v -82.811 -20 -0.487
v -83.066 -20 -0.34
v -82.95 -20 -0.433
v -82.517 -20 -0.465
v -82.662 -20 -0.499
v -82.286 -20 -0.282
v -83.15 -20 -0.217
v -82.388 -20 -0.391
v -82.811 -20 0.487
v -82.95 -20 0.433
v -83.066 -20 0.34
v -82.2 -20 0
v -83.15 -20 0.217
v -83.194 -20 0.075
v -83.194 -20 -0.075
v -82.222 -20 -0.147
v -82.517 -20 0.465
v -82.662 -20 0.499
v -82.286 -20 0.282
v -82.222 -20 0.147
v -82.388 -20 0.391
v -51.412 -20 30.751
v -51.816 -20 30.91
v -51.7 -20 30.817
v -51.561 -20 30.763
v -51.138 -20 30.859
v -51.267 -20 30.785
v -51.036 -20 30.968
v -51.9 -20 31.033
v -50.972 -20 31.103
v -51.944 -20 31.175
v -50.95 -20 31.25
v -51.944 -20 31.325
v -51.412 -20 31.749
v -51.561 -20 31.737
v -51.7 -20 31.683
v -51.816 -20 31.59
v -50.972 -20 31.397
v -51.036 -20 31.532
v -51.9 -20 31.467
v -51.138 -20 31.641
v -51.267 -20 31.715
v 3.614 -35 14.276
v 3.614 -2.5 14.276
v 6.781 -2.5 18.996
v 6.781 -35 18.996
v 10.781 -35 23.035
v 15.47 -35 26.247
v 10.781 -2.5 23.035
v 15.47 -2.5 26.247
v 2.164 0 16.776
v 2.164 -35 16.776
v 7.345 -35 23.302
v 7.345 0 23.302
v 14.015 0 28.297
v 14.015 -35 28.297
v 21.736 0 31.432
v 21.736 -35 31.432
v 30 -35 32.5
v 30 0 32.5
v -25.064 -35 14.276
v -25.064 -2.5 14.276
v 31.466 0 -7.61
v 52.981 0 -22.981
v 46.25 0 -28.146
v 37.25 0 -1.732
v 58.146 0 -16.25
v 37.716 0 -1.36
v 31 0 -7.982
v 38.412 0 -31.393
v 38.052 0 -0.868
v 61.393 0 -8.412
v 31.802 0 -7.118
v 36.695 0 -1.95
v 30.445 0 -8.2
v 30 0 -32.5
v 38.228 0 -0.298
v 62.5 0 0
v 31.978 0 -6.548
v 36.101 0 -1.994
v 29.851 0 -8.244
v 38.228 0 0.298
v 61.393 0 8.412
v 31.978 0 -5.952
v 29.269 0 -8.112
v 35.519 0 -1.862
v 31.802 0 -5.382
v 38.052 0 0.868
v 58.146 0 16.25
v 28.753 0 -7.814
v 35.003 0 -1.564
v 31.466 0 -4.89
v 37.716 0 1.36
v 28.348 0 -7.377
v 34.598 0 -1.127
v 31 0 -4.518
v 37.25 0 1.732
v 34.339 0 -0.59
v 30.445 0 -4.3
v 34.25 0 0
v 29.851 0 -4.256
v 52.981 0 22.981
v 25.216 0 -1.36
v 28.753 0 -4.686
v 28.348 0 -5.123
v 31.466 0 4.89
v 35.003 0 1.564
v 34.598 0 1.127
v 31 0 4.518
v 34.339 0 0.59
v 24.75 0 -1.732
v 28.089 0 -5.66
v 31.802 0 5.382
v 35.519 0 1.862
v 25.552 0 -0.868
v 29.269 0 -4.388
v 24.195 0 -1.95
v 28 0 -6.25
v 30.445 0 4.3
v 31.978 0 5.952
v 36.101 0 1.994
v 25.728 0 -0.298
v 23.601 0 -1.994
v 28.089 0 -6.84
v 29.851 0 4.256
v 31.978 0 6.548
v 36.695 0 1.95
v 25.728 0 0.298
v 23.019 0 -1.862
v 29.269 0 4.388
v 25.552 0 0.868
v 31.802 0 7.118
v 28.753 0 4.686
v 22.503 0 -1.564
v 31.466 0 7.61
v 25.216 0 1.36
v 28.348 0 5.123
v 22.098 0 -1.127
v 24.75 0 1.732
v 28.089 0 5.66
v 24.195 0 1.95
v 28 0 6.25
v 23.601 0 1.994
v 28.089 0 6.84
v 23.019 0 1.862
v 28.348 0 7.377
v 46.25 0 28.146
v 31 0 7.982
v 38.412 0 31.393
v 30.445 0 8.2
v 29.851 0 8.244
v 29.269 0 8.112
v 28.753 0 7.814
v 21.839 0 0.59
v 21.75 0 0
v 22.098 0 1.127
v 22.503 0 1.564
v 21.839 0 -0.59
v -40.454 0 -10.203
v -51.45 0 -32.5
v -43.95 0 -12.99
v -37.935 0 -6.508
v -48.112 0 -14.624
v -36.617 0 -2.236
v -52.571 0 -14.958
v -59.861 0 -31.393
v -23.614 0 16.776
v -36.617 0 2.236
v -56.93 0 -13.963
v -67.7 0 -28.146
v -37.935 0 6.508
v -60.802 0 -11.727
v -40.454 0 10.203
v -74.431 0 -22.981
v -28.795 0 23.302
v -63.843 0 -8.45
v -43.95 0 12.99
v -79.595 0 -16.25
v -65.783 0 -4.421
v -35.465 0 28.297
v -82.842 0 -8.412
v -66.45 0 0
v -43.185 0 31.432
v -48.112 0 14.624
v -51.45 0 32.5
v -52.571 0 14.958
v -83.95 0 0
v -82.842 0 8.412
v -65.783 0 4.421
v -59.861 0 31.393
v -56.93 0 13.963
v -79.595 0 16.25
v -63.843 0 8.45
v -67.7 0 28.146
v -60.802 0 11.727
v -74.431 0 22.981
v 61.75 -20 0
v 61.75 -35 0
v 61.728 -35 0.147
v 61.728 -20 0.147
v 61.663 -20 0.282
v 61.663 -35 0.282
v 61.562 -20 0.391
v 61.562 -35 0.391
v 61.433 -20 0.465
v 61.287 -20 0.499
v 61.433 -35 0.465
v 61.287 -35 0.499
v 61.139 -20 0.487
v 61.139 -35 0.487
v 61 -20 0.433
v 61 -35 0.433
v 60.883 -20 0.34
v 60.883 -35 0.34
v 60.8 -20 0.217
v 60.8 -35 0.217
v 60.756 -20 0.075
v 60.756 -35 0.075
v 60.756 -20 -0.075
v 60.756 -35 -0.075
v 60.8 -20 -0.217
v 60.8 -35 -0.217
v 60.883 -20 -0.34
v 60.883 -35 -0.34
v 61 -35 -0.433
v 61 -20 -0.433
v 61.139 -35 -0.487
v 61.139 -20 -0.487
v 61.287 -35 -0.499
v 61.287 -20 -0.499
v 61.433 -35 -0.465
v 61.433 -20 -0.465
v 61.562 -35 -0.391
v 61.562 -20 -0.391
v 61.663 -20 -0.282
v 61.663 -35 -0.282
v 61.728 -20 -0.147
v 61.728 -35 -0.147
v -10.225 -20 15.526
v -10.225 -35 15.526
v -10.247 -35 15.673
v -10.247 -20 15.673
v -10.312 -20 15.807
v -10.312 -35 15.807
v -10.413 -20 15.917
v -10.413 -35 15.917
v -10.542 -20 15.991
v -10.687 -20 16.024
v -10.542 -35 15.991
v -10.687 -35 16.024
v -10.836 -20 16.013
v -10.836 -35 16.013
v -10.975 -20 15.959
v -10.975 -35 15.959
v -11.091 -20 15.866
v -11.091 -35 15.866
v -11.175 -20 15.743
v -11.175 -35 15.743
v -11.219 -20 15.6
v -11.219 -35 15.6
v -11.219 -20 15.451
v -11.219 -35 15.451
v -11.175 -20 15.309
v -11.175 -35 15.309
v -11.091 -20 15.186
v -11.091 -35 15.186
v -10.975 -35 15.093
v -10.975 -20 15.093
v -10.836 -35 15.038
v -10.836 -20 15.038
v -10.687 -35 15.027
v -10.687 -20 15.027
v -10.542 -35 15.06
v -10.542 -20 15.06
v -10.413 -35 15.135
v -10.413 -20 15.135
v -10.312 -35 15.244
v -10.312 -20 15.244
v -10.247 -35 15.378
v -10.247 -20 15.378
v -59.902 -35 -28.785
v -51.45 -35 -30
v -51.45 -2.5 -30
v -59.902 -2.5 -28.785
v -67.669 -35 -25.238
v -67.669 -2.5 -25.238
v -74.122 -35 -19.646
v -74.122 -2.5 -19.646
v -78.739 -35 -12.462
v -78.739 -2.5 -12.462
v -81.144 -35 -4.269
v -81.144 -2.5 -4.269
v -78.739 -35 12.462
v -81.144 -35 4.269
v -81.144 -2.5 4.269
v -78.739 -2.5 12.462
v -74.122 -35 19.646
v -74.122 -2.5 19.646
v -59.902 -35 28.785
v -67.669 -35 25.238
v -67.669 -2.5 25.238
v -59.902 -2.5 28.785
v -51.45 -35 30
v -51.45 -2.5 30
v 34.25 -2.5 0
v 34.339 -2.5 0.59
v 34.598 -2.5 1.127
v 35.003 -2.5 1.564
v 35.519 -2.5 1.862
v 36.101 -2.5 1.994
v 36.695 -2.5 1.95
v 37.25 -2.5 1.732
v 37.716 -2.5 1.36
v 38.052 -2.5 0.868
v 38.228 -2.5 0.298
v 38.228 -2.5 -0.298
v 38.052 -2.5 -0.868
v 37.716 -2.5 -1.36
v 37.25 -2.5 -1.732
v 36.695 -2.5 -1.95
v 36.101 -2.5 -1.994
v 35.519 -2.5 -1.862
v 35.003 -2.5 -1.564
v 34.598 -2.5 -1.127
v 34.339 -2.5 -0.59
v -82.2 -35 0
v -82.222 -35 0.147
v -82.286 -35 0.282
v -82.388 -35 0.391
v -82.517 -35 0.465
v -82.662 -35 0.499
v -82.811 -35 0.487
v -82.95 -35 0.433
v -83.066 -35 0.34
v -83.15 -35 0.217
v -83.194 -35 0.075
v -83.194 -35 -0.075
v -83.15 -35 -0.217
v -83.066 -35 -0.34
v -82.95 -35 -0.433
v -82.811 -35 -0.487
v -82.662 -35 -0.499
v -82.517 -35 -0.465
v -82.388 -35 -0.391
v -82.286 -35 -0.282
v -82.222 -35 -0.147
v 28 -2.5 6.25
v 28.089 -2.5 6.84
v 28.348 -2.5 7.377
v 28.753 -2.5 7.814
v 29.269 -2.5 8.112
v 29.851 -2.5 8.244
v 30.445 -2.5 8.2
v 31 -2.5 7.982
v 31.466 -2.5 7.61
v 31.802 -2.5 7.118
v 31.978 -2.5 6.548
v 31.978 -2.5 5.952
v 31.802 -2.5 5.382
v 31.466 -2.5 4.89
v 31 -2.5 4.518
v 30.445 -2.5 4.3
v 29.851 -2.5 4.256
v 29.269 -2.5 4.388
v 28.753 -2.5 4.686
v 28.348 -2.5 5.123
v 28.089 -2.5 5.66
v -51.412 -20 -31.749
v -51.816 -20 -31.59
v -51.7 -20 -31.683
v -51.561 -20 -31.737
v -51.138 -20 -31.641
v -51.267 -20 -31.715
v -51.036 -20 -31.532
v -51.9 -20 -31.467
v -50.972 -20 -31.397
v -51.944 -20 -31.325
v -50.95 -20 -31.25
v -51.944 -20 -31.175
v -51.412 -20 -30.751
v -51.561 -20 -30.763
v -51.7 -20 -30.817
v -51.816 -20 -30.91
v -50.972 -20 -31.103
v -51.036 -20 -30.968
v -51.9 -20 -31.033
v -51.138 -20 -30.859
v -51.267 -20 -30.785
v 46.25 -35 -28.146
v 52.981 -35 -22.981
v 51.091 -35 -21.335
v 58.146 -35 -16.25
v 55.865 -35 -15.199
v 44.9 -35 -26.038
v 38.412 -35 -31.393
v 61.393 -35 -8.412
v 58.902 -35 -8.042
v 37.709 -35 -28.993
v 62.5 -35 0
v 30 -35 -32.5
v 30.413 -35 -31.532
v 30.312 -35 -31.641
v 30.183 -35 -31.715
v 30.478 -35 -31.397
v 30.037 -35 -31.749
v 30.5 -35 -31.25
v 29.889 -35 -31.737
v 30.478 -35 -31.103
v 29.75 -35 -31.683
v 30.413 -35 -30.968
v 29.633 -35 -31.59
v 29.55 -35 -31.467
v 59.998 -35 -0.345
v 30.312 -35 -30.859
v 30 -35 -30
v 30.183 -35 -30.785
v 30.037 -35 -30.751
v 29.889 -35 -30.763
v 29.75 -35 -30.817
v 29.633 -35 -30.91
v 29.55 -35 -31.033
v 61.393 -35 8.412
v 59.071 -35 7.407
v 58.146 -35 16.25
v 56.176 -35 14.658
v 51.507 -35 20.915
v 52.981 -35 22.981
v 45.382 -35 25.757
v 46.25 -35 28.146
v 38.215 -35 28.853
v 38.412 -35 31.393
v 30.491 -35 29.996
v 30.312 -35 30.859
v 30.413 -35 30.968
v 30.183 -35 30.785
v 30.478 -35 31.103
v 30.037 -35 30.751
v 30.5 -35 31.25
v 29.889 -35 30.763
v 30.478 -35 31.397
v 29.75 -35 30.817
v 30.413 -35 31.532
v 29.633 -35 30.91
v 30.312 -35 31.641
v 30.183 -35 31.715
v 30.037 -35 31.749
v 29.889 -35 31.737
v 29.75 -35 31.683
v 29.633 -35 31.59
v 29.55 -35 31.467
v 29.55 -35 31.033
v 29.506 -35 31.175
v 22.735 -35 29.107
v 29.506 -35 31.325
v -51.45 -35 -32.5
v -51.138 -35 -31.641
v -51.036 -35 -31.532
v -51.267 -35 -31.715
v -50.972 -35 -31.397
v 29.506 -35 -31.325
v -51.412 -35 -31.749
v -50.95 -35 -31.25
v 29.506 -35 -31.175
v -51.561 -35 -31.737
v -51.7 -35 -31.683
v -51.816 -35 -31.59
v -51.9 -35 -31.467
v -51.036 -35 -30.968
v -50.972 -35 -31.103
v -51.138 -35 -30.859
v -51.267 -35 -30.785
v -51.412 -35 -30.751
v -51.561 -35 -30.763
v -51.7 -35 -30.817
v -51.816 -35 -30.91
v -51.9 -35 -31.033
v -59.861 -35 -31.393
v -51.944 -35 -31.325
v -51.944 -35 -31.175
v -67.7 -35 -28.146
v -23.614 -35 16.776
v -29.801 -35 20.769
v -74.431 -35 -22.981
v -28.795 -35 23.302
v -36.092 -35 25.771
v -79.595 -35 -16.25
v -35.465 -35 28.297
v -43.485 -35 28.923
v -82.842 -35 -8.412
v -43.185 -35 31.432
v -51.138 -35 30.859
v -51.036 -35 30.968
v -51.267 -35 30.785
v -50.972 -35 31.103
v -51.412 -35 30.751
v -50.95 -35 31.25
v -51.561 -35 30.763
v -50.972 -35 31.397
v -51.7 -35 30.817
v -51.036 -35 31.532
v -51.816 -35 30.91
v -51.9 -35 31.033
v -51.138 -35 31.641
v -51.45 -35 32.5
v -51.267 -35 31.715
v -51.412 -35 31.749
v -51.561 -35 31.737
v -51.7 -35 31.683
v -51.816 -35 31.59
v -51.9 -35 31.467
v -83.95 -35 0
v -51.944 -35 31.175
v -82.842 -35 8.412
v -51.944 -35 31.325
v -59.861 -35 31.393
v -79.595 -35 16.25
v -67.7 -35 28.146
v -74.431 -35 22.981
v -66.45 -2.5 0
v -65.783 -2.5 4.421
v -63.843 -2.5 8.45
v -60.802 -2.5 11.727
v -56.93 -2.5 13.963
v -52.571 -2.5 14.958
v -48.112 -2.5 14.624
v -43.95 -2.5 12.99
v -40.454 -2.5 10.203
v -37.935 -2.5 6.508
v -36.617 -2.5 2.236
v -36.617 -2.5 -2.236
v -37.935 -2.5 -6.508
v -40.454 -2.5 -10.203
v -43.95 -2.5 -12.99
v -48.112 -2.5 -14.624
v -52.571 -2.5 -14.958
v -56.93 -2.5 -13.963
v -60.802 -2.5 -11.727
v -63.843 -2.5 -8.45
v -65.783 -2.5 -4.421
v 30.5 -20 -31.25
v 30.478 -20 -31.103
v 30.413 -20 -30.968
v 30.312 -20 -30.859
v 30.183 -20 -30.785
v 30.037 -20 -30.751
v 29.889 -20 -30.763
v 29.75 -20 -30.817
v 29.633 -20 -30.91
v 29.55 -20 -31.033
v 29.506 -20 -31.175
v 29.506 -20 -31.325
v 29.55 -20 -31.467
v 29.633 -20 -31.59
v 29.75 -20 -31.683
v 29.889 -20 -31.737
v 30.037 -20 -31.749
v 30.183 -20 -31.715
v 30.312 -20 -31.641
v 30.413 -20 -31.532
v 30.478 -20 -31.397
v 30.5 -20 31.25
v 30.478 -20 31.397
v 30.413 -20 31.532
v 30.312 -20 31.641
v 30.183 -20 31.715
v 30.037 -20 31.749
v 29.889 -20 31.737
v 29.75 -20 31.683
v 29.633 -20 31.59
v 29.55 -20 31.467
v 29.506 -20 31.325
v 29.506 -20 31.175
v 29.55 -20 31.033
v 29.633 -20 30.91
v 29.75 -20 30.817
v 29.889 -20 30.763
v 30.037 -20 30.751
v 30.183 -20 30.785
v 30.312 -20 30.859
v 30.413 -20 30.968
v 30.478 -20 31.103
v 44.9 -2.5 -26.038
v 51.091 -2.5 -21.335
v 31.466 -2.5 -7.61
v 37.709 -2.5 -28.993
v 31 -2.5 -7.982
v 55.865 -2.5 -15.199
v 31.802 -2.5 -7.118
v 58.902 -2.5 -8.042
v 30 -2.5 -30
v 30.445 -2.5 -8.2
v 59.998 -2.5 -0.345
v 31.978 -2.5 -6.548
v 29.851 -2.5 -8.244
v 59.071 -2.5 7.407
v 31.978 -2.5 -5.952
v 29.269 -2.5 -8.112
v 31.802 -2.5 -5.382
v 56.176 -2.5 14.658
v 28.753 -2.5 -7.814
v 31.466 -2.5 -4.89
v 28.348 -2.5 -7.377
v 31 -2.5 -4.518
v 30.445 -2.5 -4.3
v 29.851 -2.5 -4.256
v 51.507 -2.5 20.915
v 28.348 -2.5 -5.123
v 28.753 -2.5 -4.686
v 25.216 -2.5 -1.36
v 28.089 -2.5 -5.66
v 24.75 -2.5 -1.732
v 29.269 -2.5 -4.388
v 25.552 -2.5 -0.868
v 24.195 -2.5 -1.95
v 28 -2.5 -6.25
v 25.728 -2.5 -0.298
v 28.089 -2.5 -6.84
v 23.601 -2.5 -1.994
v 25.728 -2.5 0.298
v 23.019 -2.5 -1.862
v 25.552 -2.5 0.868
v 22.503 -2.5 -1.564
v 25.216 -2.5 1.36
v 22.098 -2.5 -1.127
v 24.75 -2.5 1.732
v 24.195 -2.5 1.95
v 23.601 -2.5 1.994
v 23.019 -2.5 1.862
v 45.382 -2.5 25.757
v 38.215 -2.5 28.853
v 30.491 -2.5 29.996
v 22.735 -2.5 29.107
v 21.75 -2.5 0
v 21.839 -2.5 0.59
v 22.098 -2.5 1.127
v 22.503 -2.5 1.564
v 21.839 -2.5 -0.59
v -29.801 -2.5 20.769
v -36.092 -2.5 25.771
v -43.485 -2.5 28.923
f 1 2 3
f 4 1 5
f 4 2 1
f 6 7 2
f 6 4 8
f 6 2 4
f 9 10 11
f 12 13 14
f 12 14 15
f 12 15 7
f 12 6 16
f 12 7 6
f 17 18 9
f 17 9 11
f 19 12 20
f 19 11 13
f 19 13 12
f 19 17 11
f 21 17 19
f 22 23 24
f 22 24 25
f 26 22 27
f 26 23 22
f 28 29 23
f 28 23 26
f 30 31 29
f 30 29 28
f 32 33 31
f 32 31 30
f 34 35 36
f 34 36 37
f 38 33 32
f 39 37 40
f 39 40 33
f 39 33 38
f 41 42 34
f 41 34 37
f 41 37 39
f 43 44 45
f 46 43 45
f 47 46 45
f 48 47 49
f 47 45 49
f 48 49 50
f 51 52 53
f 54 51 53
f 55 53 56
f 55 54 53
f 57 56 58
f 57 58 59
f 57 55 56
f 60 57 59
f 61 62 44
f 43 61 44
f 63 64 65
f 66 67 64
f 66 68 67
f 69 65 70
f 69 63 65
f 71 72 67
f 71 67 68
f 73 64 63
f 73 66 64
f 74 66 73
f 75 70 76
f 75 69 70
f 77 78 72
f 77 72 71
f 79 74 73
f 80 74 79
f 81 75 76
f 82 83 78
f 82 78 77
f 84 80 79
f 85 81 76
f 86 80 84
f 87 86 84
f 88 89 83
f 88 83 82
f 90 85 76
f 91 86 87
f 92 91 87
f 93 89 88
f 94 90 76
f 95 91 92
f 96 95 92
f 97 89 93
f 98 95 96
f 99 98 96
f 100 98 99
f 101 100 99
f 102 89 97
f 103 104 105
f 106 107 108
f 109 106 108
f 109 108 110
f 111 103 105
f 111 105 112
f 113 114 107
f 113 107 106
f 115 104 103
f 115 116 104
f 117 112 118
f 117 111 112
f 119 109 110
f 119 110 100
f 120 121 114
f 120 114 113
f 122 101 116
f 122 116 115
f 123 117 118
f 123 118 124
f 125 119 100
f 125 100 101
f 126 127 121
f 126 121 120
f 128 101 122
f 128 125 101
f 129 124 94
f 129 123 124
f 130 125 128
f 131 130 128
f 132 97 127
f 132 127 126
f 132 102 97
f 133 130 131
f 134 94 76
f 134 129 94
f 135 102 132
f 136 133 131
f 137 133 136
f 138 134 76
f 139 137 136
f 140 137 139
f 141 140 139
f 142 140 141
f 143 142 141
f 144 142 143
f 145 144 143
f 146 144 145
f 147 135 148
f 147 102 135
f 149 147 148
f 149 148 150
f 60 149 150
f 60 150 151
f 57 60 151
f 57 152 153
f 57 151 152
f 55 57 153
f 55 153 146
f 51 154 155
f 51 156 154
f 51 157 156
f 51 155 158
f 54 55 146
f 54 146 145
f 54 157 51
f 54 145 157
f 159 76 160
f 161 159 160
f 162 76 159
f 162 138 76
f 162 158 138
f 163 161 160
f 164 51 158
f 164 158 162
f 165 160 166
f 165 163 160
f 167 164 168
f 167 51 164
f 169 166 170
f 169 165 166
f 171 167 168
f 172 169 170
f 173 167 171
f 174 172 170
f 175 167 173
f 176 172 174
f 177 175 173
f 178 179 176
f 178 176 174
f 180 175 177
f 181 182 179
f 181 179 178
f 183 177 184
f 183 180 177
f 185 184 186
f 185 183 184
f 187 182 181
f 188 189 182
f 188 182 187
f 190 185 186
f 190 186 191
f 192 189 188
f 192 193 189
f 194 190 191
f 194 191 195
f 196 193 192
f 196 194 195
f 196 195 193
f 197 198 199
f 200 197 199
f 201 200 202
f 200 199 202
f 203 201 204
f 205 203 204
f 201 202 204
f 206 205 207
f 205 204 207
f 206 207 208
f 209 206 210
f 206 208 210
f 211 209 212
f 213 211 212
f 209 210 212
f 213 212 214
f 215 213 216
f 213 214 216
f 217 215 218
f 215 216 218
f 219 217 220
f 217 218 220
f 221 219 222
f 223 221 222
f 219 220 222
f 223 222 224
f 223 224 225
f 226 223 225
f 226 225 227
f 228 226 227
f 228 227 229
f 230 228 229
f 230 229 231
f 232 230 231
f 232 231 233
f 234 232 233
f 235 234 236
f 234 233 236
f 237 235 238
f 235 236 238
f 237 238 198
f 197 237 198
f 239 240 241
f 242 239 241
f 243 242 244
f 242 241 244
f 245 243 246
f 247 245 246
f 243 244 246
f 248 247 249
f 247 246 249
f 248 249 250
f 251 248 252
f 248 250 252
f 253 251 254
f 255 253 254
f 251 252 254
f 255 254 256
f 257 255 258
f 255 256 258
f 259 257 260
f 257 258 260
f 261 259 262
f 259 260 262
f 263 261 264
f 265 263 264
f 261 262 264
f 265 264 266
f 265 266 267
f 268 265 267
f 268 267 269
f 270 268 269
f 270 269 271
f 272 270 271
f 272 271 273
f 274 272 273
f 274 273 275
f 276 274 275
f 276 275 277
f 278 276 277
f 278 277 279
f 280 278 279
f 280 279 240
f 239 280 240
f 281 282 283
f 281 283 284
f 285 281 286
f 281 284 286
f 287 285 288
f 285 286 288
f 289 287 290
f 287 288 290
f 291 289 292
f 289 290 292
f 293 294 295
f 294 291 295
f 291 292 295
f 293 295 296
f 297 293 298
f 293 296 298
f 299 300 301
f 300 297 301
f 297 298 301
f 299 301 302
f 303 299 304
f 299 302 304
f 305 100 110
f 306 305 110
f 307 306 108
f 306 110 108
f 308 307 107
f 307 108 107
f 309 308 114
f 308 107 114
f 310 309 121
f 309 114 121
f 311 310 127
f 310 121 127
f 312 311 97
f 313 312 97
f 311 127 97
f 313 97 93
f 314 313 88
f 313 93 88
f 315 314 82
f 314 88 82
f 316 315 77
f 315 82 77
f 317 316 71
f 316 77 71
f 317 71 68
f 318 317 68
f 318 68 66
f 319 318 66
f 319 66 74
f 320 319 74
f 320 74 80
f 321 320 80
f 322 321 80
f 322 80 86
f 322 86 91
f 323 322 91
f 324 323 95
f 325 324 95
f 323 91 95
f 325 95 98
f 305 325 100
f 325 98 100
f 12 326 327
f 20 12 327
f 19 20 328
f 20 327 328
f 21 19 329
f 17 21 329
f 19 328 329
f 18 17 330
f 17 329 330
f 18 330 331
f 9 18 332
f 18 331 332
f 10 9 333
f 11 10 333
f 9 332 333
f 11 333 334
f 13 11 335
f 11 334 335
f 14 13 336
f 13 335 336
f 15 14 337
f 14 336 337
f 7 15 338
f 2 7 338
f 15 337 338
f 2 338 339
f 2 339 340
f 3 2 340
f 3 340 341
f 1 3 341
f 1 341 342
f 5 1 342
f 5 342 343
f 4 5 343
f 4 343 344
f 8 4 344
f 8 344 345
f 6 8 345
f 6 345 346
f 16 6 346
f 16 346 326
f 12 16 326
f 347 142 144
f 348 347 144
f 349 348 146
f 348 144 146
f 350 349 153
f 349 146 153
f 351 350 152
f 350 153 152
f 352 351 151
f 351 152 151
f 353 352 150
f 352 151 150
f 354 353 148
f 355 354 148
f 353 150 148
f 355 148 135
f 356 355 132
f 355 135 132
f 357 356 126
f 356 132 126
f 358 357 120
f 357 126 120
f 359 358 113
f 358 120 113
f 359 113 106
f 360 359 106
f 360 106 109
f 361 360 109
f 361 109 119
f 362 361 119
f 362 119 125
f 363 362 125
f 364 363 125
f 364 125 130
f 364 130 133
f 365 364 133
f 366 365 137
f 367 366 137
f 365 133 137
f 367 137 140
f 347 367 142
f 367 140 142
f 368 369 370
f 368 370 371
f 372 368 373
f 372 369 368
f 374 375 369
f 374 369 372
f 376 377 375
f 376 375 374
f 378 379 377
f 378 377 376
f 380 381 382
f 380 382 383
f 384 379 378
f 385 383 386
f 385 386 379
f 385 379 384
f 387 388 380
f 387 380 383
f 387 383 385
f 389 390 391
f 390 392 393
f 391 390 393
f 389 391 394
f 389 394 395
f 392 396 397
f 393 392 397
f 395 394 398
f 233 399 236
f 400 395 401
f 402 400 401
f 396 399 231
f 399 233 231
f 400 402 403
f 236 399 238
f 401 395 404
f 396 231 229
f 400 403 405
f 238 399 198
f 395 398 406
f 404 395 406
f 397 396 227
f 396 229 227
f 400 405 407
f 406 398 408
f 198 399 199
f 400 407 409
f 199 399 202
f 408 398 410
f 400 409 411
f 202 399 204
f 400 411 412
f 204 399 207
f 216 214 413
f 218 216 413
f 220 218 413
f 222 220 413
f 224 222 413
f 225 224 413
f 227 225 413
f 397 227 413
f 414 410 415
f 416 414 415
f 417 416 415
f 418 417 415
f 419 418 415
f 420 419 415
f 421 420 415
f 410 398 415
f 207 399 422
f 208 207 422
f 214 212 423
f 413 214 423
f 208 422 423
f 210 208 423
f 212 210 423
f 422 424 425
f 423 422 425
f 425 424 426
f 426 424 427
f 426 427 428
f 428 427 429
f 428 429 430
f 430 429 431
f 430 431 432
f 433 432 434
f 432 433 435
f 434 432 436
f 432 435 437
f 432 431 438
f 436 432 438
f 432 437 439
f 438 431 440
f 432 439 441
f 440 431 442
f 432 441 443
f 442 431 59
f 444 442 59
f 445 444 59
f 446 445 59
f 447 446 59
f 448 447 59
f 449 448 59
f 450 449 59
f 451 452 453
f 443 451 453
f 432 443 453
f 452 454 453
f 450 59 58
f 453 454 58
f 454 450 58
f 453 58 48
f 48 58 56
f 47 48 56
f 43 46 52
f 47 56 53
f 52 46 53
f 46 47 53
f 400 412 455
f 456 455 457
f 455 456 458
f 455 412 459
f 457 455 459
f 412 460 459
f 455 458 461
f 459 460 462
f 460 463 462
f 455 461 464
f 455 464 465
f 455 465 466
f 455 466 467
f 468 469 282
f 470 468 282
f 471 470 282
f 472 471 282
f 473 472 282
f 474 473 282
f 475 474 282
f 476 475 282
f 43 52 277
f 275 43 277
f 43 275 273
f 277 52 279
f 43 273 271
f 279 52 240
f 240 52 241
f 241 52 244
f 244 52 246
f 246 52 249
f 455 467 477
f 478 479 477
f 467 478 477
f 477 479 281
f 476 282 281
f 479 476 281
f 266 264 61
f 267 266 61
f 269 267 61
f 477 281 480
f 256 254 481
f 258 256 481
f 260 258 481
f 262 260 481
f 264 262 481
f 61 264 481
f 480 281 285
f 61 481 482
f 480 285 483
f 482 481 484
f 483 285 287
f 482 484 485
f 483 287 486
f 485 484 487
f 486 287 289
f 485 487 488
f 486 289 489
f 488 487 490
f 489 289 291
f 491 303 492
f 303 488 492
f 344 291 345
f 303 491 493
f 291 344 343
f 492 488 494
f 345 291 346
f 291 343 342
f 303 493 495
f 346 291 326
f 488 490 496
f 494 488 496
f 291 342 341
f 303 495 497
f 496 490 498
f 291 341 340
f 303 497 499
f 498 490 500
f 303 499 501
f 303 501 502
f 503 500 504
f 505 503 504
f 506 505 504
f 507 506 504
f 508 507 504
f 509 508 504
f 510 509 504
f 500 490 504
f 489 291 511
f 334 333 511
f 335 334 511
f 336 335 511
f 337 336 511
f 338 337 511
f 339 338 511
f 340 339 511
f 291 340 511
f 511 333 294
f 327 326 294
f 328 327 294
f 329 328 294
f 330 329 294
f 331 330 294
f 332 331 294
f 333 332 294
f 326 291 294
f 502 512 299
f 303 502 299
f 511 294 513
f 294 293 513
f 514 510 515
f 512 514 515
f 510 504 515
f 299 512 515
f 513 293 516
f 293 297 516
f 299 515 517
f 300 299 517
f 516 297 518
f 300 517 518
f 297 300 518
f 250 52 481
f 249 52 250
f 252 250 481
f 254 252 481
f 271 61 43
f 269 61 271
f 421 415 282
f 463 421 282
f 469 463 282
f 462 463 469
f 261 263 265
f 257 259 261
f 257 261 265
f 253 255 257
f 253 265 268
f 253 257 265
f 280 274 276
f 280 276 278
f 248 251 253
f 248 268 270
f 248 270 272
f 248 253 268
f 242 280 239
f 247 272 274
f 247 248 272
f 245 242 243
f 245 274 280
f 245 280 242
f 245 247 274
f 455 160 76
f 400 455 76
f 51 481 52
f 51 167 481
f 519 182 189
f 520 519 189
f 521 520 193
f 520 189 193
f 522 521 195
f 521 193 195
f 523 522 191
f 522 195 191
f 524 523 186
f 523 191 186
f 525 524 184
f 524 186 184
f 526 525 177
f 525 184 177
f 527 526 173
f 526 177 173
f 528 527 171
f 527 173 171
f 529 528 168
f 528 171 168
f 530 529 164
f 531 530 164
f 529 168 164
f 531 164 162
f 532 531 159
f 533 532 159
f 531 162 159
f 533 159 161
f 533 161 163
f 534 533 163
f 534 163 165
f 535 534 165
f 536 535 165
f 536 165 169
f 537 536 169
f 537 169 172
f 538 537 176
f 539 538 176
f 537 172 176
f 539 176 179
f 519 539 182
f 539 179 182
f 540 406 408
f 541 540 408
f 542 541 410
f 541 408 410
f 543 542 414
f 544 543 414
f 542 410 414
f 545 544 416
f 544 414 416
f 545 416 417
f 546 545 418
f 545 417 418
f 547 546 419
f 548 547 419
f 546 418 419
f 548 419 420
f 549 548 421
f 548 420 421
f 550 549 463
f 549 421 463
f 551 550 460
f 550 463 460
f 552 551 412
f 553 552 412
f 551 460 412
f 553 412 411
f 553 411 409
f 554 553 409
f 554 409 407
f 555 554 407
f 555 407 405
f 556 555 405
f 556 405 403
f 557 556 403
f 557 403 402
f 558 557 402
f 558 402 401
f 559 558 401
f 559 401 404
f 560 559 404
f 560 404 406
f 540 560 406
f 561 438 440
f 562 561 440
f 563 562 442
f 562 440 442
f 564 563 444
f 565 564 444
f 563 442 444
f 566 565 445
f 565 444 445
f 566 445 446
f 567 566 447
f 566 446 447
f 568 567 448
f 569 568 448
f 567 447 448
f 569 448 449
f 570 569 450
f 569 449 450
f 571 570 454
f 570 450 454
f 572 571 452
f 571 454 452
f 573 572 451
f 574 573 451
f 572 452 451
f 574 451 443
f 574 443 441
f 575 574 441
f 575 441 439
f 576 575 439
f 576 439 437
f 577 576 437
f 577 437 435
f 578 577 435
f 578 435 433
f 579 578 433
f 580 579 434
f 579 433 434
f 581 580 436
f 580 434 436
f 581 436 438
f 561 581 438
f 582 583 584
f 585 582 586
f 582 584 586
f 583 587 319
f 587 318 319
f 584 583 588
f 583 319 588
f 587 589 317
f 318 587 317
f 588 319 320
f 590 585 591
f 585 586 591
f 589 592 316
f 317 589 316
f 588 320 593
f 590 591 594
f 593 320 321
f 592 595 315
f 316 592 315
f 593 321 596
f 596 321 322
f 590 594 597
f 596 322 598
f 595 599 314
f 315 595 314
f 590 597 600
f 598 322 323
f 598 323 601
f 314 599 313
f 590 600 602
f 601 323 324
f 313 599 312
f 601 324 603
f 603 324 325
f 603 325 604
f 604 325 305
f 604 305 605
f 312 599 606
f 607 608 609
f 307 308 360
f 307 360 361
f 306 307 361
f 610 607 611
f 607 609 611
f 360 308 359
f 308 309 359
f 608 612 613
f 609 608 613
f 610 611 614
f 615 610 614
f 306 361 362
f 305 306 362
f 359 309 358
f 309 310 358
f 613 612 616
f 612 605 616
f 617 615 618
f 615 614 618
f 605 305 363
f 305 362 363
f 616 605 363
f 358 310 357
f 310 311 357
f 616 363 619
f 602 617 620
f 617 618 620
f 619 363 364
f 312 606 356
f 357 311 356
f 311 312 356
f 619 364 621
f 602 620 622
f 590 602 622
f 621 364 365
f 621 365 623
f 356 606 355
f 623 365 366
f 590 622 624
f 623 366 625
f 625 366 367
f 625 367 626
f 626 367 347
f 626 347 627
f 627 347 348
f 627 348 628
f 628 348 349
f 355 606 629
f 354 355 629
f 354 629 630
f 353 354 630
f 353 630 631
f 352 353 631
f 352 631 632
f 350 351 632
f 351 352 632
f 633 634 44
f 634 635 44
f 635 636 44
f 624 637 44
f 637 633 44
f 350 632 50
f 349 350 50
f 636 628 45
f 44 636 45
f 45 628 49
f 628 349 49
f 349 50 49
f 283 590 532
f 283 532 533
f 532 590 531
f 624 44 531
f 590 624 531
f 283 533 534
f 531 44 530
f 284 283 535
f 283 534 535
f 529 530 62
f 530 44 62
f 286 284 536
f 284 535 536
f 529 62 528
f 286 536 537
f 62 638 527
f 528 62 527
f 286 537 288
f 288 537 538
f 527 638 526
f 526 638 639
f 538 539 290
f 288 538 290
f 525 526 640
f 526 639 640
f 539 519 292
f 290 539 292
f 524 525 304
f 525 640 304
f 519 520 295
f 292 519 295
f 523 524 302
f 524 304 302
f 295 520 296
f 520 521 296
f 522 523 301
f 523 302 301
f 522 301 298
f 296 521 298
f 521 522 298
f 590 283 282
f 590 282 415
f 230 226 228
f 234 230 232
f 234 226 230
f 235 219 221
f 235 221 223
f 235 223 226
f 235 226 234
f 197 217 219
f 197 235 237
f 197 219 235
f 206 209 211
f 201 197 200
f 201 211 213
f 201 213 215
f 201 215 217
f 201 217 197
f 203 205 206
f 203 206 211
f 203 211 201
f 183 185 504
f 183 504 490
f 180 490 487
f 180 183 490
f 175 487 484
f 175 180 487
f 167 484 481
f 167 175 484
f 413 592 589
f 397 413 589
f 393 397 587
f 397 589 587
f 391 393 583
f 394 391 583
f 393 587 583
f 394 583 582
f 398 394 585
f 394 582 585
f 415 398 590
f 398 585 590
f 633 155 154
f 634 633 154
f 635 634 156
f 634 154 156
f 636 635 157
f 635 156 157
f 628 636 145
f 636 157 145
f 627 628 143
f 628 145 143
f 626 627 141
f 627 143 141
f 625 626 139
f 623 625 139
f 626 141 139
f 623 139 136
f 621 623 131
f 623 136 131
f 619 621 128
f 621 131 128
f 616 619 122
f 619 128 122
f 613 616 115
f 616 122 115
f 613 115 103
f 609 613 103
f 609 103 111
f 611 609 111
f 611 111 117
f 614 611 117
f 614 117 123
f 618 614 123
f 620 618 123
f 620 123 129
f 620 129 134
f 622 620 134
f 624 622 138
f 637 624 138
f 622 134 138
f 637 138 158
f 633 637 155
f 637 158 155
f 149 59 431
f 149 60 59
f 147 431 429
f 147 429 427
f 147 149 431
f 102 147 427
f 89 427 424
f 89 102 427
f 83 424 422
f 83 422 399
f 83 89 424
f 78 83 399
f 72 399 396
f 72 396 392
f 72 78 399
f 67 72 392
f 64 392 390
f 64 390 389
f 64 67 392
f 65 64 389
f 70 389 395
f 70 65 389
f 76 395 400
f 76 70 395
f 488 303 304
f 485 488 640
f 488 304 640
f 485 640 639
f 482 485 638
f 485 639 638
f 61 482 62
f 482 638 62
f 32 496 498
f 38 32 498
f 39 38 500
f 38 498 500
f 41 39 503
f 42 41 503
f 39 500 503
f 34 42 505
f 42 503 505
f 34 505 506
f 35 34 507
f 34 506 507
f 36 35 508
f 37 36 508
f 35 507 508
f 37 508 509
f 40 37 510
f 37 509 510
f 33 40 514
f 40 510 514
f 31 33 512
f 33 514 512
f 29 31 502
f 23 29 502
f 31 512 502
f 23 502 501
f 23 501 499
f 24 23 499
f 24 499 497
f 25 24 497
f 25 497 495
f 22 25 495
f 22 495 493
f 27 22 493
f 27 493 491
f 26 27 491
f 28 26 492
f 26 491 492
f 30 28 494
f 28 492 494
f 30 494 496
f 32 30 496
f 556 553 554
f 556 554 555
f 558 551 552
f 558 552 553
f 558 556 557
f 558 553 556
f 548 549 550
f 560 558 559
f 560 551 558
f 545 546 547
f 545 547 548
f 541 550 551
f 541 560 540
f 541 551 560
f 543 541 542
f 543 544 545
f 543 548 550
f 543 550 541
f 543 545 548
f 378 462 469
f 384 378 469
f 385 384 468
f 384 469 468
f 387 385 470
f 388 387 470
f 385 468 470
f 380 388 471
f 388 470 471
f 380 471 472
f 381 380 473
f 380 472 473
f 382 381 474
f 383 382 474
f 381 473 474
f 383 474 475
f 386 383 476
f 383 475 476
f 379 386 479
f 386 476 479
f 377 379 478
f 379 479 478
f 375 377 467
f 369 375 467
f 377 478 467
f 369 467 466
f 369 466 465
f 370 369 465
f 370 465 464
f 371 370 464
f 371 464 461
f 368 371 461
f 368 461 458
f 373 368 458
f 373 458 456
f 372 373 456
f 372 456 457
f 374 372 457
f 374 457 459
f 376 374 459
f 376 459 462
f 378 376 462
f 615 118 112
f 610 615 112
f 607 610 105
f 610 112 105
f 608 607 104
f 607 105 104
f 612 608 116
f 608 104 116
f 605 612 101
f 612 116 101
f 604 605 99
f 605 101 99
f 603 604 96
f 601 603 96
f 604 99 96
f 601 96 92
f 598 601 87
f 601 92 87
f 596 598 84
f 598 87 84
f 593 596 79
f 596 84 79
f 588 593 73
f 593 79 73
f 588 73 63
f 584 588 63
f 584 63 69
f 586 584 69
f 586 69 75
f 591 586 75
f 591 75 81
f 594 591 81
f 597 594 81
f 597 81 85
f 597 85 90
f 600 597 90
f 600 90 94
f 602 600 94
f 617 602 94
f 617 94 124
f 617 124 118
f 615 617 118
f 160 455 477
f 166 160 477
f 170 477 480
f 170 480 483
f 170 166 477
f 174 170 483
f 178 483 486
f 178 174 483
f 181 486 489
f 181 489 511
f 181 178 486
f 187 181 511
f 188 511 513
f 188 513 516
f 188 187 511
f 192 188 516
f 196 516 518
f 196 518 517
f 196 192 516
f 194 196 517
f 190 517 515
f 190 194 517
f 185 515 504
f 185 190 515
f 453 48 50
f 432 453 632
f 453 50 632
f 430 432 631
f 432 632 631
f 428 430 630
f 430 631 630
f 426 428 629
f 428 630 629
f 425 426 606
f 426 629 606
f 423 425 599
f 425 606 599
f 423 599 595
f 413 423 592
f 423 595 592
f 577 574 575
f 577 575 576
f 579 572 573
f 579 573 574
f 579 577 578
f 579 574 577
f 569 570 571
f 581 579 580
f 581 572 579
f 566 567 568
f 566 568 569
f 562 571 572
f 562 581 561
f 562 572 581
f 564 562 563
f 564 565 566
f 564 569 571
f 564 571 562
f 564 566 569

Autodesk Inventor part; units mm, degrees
sketch "Sketch1" plane through (0, 0, 0) normal (0, 1, 0) x (-1, 0, 0)
  line L0 (30, 0) -> (-30, 0) construction
  arc A0 (-30, 32.5) -> (-30, -32.5) centre (-30, 0) ccw
  circle A1 centre (-30, 0) radius 32.5 construction
  circle A2 centre (-30, 0) radius 30 construction
  circle A3 centre (-30, -6.25) radius 2
  circle A4 centre (-30, 6.25) radius 2
  arc A5 (-15.4703, 26.2467) -> (-59.998, -0.3452) centre (-30, 0) ccw
  arc A6 (-3.6144, 14.2758) -> (-15.4703, 26.2467) centre (-30, 0) ccw
  arc A7 (-2.1644, 16.7758) -> (-30, 32.5) centre (-30, 0) ccw
  line L1 (-30, -6.25) -> (-30, 6.25) construction
  line L2 (-30, 0) -> (-36.25, 0) construction
  line L3 (-30, 0) -> (-23.75, 0) construction
  line L4 (-30, 0) -> (-23.75, 0) construction
  circle A8 centre (-23.75, 0) radius 2
  circle A9 centre (-36.25, 0) radius 2
  line L5 (-30, 0) -> (-30, -6.25) construction
  line L6 (-3.6144, 14.2758) -> (-3.6144, -14.2758) construction
  line L7 (-2.1644, 16.7758) -> (-2.1644, -16.7758) construction
  line L8 (-30, 32.5) -> (52.5439, 32.5) construction
  line L9 (-2.1644, 16.7758) -> (17.8356, 16.7758) construction
  line L10 (17.8356, 16.7758) -> (17.8356, -16.7758) construction
  line L11 (17.8356, -16.7758) -> (-2.1644, -16.7758) construction
  line L12 (-3.6144, -14.2758) -> (19.2856, -14.2758) construction
  line L13 (19.2856, -14.2758) -> (19.2856, 14.2758) construction
  line L14 (-3.6144, 14.2758) -> (19.2856, 14.2758) construction
  line L15 (0, 16.7758) -> (0, -16.7758) construction
  line L16 (2.5, 0) -> (2.5, 16.7758) construction
  line L17 (2.5, 0) -> (2.5, -16.7758) construction
  line L18 (19.2856, 0) -> (21.4496, 0) construction
  line L19 (21.4496, 0) -> (21.4496, 16.7758) construction
  line L20 (21.4496, 16.7758) -> (17.8356, 16.7758) construction
  line L21 (19.2856, 14.2758) -> (19.2856, 16.7758) construction
  line L22 (21.4496, 0) -> (21.4496, -16.7758) construction
  line L23 (21.4496, -16.7758) -> (17.8356, -16.7758) construction
  line L24 (19.2856, -14.2758) -> (19.2856, -16.7758) construction
  line L25 (21.4496, 0) -> (51.4496, 0) construction
  circle A10 centre (51.4496, 0) radius 30 construction
  circle A11 centre (51.4496, 0) radius 32.5 construction
  line L26 (19.2856, 14.2758) -> (25.064, 14.2758) construction
  line L27 (20.3676, 16.7758) -> (23.614, 16.7758) construction
  line L28 (17.3742, -16.7758) -> (23.614, -16.7758) construction
  line L29 (17.8356, -14.2758) -> (22.2529, -14.2758) construction
  line L30 (22.2529, -14.2758) -> (25.064, -14.2758) construction
  arc A12 (81.4496, 0) -> (51.4496, 30) centre (51.4496, 0) ccw
  arc A13 (51.4496, -30) -> (81.4496, 0) centre (51.4496, 0) ccw
  line L31 (51.4496, 30) -> (51.4496, -30) construction
  arc A14 (51.4496, 30) -> (25.064, 14.2758) centre (51.4496, 0) ccw
  line L32 (25.064, 14.2758) -> (-3.6144, 14.2758)
  line L33 (23.614, 16.7758) -> (-2.1644, 16.7758)
  arc A15 (51.4496, -32.5) -> (83.9496, 0) centre (51.4496, 0) ccw
  arc A16 (83.9496, 0) -> (51.4496, 32.5) centre (51.4496, 0) ccw
  arc A17 (51.4496, 32.5) -> (23.614, 16.7758) centre (51.4496, 0) ccw
  circle A18 centre (51.4496, 0) radius 15
  line L34 (51.4496, -32.5) -> (-30, -32.5)
  line L35 (51.4496, -30) -> (-30, -30)
  arc A19 (-59.998, -0.3452) -> (-30, -30) centre (-30, 0) ccw
  point P0 (0, 0)
  point P1 (-30, 32.5)
  point P2 (-25, 0)
  point P3 (7.8356, 16.7758)
  dimension "d1" = 30
  dimension "d2" = 65
  dimension "d12" = 60
  dimension "d25" = 4
  dimension "d28" = 4
  dimension "d51" = 12.5
  dimension "d60" = 6.25
  dimension "d61" = 180
  dimension "d62" = 6.25
  dimension "d63" = 4
  dimension "d64" = 4
  dimension "d65" = 6.25
  dimension "d68" = 20
  dimension "d69" = 1.45
  dimension "d70" = 1.45
  dimension "d71" = 2.5
  dimension "d72" = 2.5
  dimension "d73" = 2.1644
  dimension "d74" = 2.164
  dimension "d75" = 30
  dimension "d76" = 60
  dimension "d77" = 65
  dimension "d78" = 60
  dimension "d79" = 30
ref_plane "Work Plane1" through (0, -5, 0) normal (0, -1, 0) x (1, 0, 0)
ref_plane "Work Plane3" through (0, -35, 0) normal (0, -1, 0) x (1, 0, 0)
sketch "Sketch3" plane through (0, -35, 0) normal (0, -1, 0) x (1, 0, 0)
  point P0 (0, 0)
extrude "Extrusion12" add sketch "Sketch1" against normal blind 2.5 contours A6 L32 A14 A12 A13 L35 A19 A5
extrude "Extrusion13" add sketch "Sketch1" against normal blind 35 contours A7 L33 A17 A16 A15 L34 A0
ref_plane "Work Plane4" through (0, -35, 0) normal (0, -1, 0) x (1, 0, 0)
sketch "Sketch5" plane through (0, -35, 0) normal (0, -1, 0) x (1, 0, 0)
  line L0 (-25.064, 14.2758) -> (3.6144, 14.2758) construction
  line L1 (30, -30) -> (-51.4496, -30) construction
  line L2 (3.6144, 14.2758) -> (-51.4496, -30) construction
  line L3 (-25.064, 14.2758) -> (30, -30) construction
  line L4 (-10.7248, 14.2758) -> (-10.7248, -30) construction
  line L5 (30, -30) -> (30, 30) construction
  arc A0 (30, -30) -> (3.6144, 14.2758) centre (30, 0) ccw construction
  arc A1 (-25.064, 14.2758) -> (-51.4496, -30) centre (-51.4496, 0) ccw construction
  line L6 (-51.4496, -30) -> (-51.4496, 30) construction
  arc A2 (-23.614, 16.7758) -> (-51.4496, -32.5) centre (-51.4496, 0) ccw construction
  arc A3 (30, -32.5) -> (2.1644, 16.7758) centre (30, 0) ccw construction
  line L7 (62.5, 0) -> (60, 0) construction
  line L8 (30, -30) -> (30, -32.5) construction
  line L9 (-51.4496, -30) -> (-51.4496, -32.5) construction
  line L10 (-51.4496, 30) -> (-51.4496, 32.5) construction
  line L11 (30, 30) -> (30, 32.5) construction
  line L12 (-10.7248, -30) -> (-10.7248, -32.5) construction
  line L13 (30, -32.5) -> (-51.4496, -32.5) construction
  line L14 (-10.7248, 14.2758) -> (-10.7248, 16.7758) construction
  circle A4 centre (-10.7248, 15.5258) radius 0.5
  circle A5 centre (30, 31.25) radius 0.5
  circle A6 centre (61.25, 0) radius 0.5
  circle A7 centre (30, -31.25) radius 0.5
  circle A8 centre (-51.4496, -31.25) radius 0.5
  circle A9 centre (-51.4496, 31.25) radius 0.5
  line L15 (30, 31.25) -> (-51.4496, 31.25) construction
  line L16 (59.4615, 0) -> (-81.4496, 0) construction
  line L17 (-81.4496, 0) -> (-83.9496, 0) construction
  circle A10 centre (-82.6996, 0) radius 0.5
  point P0 (0, 0)
  dimension "d100" = 1
  dimension "d101" = 1
  dimension "d102" = 1
  dimension "d103" = 1
  dimension "d104" = 1
  dimension "d105" = 1
  dimension "d106" = 81.4496
  dimension "d108" = 140.9111
  dimension "d109" = 1
extrude "Extrusion14" cut sketch "Sketch5" against normal blind 15
properties part number "con_v6_d1_3DPrint"
